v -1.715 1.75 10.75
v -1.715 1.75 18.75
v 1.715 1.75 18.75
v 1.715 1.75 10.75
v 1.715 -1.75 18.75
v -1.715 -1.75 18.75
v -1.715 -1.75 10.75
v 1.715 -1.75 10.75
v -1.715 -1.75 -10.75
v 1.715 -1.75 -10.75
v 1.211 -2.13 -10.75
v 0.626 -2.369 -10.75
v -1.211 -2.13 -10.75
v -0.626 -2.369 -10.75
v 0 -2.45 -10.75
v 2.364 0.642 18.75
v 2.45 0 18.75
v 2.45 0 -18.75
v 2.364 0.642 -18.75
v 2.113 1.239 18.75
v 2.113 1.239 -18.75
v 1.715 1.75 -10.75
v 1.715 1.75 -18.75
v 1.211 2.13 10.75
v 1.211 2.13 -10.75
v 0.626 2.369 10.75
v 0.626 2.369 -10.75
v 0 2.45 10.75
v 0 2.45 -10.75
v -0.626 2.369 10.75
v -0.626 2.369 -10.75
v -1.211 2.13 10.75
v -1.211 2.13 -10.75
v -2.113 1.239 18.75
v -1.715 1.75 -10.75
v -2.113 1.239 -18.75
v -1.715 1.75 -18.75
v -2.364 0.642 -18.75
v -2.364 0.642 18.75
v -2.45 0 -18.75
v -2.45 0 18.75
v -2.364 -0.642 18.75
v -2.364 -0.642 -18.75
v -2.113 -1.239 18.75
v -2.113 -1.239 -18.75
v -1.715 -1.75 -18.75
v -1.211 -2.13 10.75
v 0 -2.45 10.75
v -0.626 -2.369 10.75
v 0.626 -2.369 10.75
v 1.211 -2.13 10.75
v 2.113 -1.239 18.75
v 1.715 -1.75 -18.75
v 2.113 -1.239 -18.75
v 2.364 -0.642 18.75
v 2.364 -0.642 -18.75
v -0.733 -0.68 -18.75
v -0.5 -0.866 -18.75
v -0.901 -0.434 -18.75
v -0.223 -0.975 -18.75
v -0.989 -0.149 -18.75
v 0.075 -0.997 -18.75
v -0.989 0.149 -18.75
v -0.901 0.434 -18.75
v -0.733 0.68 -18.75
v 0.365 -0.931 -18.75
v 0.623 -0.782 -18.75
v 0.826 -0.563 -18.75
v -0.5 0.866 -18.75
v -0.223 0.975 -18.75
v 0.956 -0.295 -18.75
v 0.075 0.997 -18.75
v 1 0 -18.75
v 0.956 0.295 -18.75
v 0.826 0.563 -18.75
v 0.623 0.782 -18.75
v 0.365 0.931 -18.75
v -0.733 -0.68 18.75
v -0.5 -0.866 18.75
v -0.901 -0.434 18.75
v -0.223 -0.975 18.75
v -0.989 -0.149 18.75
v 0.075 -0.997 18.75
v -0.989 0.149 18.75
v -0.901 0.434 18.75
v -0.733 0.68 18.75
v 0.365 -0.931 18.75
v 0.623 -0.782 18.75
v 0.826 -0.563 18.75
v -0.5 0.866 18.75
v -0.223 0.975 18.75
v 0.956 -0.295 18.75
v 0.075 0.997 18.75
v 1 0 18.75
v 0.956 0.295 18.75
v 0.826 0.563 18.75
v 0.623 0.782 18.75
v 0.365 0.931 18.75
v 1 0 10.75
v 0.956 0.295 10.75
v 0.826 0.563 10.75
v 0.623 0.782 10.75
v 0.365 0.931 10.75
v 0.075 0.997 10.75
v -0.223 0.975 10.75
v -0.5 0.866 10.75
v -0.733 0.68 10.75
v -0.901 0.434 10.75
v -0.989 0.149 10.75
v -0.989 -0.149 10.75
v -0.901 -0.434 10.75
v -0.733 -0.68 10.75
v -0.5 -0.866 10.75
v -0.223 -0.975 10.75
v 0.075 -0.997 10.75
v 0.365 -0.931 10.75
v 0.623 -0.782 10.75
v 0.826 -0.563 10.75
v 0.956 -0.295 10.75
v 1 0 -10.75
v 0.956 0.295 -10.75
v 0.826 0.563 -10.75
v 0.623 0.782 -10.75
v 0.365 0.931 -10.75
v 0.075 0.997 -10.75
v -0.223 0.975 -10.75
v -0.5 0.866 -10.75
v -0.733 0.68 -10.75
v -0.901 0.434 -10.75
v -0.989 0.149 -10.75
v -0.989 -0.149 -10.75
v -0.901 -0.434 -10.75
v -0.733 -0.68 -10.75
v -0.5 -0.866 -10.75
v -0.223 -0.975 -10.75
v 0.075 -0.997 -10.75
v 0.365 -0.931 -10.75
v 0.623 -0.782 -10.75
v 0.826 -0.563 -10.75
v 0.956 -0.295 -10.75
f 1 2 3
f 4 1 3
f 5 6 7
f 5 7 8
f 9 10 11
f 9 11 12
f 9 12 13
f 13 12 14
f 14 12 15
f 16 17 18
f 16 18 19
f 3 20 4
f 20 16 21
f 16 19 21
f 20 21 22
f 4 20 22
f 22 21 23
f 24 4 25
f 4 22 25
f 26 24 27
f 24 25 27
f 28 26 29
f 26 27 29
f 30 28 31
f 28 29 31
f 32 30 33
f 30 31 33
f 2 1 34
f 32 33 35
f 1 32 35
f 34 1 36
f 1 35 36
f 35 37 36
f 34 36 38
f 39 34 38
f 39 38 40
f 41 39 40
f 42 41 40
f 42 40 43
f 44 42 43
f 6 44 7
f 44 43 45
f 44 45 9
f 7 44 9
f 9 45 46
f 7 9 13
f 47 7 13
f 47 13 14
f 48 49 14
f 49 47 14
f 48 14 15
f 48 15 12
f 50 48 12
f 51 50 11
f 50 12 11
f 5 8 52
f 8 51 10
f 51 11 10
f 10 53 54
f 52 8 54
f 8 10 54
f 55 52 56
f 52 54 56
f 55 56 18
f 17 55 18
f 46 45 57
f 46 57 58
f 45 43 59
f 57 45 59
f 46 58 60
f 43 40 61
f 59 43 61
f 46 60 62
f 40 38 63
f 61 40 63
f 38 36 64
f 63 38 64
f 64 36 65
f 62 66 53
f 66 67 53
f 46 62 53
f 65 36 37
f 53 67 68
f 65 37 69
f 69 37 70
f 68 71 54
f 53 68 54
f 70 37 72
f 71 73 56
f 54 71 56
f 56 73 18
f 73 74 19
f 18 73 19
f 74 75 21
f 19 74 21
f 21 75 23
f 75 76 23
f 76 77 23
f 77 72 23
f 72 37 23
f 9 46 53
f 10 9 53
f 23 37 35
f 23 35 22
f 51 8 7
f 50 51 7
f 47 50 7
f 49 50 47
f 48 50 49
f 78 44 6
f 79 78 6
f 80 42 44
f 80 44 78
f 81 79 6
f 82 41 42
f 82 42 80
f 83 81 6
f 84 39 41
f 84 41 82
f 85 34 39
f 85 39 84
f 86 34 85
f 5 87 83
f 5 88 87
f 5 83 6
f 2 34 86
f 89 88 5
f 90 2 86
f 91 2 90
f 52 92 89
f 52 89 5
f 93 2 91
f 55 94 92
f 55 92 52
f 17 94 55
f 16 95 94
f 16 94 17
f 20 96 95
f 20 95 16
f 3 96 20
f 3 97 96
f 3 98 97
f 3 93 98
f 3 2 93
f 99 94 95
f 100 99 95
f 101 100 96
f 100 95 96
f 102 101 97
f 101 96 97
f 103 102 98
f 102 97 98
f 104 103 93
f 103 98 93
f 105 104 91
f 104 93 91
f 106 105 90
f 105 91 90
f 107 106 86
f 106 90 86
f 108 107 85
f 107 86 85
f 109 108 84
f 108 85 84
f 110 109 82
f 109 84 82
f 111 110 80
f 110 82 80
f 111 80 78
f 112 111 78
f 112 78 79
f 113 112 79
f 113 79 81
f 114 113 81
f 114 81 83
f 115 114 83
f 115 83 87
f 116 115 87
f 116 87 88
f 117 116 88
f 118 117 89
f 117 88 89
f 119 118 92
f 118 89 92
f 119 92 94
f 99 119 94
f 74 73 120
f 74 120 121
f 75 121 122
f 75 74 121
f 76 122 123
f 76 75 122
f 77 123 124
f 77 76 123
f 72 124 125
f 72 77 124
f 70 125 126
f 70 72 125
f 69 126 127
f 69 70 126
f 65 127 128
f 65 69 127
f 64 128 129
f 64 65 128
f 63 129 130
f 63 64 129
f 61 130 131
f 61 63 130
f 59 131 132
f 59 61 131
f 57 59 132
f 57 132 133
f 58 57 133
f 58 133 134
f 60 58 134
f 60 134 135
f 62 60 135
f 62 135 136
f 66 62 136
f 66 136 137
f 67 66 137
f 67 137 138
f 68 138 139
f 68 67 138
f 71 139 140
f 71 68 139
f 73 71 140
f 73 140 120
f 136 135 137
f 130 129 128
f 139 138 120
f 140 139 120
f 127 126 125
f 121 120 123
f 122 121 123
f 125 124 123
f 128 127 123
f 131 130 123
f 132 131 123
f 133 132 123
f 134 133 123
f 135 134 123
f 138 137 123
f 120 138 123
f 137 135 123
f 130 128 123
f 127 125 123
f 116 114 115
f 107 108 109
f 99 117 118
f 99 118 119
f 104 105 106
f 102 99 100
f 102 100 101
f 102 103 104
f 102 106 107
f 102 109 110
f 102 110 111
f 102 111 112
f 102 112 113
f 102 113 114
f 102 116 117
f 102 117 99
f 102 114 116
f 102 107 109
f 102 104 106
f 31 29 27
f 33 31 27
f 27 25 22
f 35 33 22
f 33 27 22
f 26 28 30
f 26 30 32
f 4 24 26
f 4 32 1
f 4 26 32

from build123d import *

# Parameters (mm, degrees)
SALIENTE_EXTRUIR1_DEPTH      = 18.75
SALIENTE_EXTRUIR1_DEPTH_BACK = 18.75
CROQUIS1_R                   = 2.45
CROQUIS3_R                   = 1
CORTAR_EXTRUIR1_DEPTH        = 8


with BuildPart() as part:
    # Croquis1 → Saliente-Extruir1 (new, two sides: drawn at the far end of the back side and taken through both)
    with BuildSketch(Plane.XY.offset(-SALIENTE_EXTRUIR1_DEPTH_BACK)):
        Circle(CROQUIS1_R)
    extrude(amount=SALIENTE_EXTRUIR1_DEPTH + SALIENTE_EXTRUIR1_DEPTH_BACK)

    # Croquis3 → Cortar-Extruir1 (cut)
    with BuildSketch(Plane.XY.offset(18.75)):
        Circle(CROQUIS3_R)
        with BuildLine():
            Line((-1.71464282, 1.75), (1.71464282, 1.75))
            ThreePointArc((1.71464282, 1.75), (0, 2.45), (-1.71464282, 1.75))
        make_face()
        with BuildLine():
            Line((-1.71464282, -1.75), (1.71464282, -1.75))
            ThreePointArc((1.71464282, -1.75), (0, -2.45), (-1.71464282, -1.75))
        make_face()
    cortar_extruir1 = extrude(amount=-CORTAR_EXTRUIR1_DEPTH, mode=Mode.SUBTRACT)

    # Simetría1: Cortar-Extruir1 across plane
    add(cortar_extruir1.mirror(Plane.XY), mode=Mode.SUBTRACT)


solid = part.part
